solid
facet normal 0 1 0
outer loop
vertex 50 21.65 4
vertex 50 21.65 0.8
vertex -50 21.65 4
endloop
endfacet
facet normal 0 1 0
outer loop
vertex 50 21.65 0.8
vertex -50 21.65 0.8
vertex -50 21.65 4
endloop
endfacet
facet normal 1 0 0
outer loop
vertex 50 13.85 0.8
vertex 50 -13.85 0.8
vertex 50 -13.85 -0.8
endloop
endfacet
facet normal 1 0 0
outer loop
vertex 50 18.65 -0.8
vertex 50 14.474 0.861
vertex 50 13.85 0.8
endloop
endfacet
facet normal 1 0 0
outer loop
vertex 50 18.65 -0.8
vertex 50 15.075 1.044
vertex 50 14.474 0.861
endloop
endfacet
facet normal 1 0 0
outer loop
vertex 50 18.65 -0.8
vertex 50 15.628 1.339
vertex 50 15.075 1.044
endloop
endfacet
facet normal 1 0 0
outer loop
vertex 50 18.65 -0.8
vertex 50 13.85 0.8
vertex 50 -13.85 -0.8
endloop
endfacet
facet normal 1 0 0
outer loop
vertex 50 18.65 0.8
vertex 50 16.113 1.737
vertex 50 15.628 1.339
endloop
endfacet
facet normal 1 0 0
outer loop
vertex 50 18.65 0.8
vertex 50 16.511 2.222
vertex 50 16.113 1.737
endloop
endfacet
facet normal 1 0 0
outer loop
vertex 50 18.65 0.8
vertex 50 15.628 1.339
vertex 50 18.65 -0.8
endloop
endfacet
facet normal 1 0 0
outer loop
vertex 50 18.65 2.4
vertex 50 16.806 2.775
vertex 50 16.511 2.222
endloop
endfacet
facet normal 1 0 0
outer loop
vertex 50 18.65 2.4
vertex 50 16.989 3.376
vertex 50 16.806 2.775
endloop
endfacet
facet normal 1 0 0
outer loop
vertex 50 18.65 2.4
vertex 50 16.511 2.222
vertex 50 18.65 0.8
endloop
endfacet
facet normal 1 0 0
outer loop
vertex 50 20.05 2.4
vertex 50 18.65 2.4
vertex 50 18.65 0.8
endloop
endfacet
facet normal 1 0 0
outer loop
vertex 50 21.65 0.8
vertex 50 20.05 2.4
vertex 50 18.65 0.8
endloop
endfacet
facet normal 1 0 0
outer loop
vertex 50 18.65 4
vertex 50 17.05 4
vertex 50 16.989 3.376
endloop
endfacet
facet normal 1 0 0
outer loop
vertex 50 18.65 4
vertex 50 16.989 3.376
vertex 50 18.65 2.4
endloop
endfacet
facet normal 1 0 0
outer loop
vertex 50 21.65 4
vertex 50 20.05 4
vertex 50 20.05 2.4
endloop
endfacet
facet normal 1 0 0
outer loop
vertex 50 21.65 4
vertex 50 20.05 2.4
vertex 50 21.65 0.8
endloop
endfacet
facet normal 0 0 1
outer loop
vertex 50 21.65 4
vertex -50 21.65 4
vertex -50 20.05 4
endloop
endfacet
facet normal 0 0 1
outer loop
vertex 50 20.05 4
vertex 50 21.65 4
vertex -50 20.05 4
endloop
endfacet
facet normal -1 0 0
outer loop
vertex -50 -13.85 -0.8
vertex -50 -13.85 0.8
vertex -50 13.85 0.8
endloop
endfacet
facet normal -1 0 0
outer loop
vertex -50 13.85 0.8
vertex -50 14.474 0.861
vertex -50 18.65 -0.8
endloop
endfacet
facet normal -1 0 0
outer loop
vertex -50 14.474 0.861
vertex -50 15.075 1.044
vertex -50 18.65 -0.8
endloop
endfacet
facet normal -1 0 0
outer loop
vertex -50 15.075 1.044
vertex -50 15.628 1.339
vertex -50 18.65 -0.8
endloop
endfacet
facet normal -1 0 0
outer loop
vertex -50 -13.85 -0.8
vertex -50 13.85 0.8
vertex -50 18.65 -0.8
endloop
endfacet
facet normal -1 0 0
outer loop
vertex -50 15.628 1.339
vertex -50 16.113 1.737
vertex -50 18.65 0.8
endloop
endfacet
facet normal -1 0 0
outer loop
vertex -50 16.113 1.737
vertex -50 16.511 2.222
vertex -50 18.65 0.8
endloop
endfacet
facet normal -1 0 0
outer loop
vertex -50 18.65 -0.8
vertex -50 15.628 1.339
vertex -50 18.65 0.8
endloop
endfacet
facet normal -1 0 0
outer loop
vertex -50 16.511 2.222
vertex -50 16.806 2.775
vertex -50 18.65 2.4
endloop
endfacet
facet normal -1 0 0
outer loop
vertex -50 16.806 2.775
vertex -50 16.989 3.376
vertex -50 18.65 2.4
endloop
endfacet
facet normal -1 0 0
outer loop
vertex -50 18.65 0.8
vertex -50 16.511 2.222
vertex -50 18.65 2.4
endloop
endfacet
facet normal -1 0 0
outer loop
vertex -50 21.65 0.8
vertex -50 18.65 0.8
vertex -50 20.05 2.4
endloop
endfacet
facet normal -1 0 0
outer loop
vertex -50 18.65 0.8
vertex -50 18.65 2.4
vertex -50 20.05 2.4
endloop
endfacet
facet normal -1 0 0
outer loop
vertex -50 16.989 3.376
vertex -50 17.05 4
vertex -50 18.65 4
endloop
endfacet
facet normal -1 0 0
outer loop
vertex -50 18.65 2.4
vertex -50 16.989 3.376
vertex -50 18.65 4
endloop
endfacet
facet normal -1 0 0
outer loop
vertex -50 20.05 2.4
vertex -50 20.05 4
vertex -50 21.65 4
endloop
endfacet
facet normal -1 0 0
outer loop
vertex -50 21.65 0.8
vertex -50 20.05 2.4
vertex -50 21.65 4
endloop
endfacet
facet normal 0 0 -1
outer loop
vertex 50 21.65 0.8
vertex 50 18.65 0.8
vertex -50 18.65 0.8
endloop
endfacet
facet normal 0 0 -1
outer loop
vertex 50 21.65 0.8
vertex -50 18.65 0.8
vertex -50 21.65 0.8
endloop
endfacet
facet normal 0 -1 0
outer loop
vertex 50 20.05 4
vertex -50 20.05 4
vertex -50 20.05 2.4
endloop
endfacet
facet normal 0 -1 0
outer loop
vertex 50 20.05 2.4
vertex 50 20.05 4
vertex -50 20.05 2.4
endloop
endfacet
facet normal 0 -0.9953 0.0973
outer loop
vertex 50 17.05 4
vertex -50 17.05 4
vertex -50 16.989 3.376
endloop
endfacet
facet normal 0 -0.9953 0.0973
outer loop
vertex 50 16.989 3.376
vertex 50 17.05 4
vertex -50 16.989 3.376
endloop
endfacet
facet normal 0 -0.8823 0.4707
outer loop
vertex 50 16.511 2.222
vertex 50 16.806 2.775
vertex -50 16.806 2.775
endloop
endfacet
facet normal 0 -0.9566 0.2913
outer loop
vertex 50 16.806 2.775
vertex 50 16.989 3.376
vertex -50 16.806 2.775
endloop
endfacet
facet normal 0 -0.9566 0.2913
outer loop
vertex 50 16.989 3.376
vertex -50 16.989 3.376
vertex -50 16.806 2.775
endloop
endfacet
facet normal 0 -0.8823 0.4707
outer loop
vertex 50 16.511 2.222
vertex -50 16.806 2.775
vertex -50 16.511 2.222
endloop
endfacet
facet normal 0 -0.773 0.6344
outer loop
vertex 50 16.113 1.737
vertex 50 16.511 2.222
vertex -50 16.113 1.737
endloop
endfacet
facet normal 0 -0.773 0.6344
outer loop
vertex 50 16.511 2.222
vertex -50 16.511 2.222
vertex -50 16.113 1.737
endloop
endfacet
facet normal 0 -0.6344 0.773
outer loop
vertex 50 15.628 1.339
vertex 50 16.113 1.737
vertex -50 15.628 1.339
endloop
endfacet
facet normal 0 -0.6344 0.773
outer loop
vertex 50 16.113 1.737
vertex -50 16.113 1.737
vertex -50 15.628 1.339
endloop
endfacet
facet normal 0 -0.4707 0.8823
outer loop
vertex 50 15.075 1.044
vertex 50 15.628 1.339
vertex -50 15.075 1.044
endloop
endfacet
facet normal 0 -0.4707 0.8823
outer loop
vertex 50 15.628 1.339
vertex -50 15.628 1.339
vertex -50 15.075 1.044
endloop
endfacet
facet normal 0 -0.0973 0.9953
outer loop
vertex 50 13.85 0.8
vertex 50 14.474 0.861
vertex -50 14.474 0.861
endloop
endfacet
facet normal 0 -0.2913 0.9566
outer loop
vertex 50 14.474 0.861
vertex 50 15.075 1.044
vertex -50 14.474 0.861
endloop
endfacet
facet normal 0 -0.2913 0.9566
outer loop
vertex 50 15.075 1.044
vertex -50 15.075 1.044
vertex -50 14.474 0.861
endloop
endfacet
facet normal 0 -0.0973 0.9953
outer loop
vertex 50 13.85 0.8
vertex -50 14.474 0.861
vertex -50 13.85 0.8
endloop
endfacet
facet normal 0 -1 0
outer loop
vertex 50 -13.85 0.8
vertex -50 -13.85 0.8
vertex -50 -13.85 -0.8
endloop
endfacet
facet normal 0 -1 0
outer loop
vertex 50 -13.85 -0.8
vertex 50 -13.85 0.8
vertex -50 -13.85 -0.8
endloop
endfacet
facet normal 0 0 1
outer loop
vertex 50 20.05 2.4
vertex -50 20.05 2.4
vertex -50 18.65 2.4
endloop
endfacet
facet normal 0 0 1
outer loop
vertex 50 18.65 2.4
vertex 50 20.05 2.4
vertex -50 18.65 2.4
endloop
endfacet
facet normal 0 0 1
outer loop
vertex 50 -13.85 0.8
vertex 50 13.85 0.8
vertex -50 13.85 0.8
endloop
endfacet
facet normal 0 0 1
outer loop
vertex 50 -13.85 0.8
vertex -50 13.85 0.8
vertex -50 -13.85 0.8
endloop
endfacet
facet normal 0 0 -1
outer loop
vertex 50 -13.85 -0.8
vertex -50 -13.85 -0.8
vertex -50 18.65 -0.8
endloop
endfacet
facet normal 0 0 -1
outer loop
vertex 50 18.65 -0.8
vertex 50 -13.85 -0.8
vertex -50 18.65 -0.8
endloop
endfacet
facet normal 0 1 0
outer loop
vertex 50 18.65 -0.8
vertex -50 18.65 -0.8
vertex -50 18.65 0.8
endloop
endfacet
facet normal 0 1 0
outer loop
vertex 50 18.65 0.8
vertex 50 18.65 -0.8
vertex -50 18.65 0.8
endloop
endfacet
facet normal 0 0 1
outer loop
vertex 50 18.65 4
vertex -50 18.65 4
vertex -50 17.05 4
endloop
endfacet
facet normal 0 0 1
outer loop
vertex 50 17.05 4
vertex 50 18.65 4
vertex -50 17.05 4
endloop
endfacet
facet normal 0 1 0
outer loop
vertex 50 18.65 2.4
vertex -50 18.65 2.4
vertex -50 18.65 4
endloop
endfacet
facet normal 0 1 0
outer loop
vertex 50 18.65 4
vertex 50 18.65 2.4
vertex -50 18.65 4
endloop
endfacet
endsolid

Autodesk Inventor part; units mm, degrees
sketch "Sketch2" plane through (0, 0, 0) normal (1, 0, 0) x (0, 1, 0)
  line L0 (13.85, 0.8) -> (-13.85, 0.8)
  line L1 (-13.85, 0.8) -> (-13.85, -0.8)
  line L2 (-13.85, -0.8) -> (18.65, -0.8)
  line L3 (18.65, -0.8) -> (18.65, 0.8)
  line L4 (0, 4.96) -> (0, -1.76) projected
  line L5 (-20.95, 0) -> (28.75, 0) projected
  line L6 (18.65, 0.8) -> (21.65, 0.8)
  line L7 (21.65, 0.8) -> (21.65, 4)
  line L8 (21.65, 4) -> (20.05, 4)
  line L9 (20.05, 4) -> (20.05, 2.4)
  line L10 (20.05, 2.4) -> (18.65, 2.4)
  line L11 (18.65, 2.4) -> (18.65, 4)
  line L12 (18.65, 4) -> (17.05, 4)
  line L13 (17.05, 4) -> (17.05, 4)
  arc A0 (13.85, 0.8) -> (17.05, 4) centre (13.85, 4) ccw
  point P0 (0, 0)
  point P1 (0, 0.8)
  point P2 (18.65, 0)
  dimension "d0" = 32.5
  dimension "d1" = 1.6
  dimension "d2" = 3
  dimension "d3" = 3.2
  dimension "d4" = 1.6
  dimension "d6" = 1.6
  dimension "d7" = 1.6
  dimension "d8" = 1.4
  dimension "d12" = 1.6
  dimension "d13" = 3.2
extrude "Extrusion1" add sketch "Sketch2" along normal mid plane 100
equation "\"d13\" = d3"
properties part number "Hanging_Wall"
